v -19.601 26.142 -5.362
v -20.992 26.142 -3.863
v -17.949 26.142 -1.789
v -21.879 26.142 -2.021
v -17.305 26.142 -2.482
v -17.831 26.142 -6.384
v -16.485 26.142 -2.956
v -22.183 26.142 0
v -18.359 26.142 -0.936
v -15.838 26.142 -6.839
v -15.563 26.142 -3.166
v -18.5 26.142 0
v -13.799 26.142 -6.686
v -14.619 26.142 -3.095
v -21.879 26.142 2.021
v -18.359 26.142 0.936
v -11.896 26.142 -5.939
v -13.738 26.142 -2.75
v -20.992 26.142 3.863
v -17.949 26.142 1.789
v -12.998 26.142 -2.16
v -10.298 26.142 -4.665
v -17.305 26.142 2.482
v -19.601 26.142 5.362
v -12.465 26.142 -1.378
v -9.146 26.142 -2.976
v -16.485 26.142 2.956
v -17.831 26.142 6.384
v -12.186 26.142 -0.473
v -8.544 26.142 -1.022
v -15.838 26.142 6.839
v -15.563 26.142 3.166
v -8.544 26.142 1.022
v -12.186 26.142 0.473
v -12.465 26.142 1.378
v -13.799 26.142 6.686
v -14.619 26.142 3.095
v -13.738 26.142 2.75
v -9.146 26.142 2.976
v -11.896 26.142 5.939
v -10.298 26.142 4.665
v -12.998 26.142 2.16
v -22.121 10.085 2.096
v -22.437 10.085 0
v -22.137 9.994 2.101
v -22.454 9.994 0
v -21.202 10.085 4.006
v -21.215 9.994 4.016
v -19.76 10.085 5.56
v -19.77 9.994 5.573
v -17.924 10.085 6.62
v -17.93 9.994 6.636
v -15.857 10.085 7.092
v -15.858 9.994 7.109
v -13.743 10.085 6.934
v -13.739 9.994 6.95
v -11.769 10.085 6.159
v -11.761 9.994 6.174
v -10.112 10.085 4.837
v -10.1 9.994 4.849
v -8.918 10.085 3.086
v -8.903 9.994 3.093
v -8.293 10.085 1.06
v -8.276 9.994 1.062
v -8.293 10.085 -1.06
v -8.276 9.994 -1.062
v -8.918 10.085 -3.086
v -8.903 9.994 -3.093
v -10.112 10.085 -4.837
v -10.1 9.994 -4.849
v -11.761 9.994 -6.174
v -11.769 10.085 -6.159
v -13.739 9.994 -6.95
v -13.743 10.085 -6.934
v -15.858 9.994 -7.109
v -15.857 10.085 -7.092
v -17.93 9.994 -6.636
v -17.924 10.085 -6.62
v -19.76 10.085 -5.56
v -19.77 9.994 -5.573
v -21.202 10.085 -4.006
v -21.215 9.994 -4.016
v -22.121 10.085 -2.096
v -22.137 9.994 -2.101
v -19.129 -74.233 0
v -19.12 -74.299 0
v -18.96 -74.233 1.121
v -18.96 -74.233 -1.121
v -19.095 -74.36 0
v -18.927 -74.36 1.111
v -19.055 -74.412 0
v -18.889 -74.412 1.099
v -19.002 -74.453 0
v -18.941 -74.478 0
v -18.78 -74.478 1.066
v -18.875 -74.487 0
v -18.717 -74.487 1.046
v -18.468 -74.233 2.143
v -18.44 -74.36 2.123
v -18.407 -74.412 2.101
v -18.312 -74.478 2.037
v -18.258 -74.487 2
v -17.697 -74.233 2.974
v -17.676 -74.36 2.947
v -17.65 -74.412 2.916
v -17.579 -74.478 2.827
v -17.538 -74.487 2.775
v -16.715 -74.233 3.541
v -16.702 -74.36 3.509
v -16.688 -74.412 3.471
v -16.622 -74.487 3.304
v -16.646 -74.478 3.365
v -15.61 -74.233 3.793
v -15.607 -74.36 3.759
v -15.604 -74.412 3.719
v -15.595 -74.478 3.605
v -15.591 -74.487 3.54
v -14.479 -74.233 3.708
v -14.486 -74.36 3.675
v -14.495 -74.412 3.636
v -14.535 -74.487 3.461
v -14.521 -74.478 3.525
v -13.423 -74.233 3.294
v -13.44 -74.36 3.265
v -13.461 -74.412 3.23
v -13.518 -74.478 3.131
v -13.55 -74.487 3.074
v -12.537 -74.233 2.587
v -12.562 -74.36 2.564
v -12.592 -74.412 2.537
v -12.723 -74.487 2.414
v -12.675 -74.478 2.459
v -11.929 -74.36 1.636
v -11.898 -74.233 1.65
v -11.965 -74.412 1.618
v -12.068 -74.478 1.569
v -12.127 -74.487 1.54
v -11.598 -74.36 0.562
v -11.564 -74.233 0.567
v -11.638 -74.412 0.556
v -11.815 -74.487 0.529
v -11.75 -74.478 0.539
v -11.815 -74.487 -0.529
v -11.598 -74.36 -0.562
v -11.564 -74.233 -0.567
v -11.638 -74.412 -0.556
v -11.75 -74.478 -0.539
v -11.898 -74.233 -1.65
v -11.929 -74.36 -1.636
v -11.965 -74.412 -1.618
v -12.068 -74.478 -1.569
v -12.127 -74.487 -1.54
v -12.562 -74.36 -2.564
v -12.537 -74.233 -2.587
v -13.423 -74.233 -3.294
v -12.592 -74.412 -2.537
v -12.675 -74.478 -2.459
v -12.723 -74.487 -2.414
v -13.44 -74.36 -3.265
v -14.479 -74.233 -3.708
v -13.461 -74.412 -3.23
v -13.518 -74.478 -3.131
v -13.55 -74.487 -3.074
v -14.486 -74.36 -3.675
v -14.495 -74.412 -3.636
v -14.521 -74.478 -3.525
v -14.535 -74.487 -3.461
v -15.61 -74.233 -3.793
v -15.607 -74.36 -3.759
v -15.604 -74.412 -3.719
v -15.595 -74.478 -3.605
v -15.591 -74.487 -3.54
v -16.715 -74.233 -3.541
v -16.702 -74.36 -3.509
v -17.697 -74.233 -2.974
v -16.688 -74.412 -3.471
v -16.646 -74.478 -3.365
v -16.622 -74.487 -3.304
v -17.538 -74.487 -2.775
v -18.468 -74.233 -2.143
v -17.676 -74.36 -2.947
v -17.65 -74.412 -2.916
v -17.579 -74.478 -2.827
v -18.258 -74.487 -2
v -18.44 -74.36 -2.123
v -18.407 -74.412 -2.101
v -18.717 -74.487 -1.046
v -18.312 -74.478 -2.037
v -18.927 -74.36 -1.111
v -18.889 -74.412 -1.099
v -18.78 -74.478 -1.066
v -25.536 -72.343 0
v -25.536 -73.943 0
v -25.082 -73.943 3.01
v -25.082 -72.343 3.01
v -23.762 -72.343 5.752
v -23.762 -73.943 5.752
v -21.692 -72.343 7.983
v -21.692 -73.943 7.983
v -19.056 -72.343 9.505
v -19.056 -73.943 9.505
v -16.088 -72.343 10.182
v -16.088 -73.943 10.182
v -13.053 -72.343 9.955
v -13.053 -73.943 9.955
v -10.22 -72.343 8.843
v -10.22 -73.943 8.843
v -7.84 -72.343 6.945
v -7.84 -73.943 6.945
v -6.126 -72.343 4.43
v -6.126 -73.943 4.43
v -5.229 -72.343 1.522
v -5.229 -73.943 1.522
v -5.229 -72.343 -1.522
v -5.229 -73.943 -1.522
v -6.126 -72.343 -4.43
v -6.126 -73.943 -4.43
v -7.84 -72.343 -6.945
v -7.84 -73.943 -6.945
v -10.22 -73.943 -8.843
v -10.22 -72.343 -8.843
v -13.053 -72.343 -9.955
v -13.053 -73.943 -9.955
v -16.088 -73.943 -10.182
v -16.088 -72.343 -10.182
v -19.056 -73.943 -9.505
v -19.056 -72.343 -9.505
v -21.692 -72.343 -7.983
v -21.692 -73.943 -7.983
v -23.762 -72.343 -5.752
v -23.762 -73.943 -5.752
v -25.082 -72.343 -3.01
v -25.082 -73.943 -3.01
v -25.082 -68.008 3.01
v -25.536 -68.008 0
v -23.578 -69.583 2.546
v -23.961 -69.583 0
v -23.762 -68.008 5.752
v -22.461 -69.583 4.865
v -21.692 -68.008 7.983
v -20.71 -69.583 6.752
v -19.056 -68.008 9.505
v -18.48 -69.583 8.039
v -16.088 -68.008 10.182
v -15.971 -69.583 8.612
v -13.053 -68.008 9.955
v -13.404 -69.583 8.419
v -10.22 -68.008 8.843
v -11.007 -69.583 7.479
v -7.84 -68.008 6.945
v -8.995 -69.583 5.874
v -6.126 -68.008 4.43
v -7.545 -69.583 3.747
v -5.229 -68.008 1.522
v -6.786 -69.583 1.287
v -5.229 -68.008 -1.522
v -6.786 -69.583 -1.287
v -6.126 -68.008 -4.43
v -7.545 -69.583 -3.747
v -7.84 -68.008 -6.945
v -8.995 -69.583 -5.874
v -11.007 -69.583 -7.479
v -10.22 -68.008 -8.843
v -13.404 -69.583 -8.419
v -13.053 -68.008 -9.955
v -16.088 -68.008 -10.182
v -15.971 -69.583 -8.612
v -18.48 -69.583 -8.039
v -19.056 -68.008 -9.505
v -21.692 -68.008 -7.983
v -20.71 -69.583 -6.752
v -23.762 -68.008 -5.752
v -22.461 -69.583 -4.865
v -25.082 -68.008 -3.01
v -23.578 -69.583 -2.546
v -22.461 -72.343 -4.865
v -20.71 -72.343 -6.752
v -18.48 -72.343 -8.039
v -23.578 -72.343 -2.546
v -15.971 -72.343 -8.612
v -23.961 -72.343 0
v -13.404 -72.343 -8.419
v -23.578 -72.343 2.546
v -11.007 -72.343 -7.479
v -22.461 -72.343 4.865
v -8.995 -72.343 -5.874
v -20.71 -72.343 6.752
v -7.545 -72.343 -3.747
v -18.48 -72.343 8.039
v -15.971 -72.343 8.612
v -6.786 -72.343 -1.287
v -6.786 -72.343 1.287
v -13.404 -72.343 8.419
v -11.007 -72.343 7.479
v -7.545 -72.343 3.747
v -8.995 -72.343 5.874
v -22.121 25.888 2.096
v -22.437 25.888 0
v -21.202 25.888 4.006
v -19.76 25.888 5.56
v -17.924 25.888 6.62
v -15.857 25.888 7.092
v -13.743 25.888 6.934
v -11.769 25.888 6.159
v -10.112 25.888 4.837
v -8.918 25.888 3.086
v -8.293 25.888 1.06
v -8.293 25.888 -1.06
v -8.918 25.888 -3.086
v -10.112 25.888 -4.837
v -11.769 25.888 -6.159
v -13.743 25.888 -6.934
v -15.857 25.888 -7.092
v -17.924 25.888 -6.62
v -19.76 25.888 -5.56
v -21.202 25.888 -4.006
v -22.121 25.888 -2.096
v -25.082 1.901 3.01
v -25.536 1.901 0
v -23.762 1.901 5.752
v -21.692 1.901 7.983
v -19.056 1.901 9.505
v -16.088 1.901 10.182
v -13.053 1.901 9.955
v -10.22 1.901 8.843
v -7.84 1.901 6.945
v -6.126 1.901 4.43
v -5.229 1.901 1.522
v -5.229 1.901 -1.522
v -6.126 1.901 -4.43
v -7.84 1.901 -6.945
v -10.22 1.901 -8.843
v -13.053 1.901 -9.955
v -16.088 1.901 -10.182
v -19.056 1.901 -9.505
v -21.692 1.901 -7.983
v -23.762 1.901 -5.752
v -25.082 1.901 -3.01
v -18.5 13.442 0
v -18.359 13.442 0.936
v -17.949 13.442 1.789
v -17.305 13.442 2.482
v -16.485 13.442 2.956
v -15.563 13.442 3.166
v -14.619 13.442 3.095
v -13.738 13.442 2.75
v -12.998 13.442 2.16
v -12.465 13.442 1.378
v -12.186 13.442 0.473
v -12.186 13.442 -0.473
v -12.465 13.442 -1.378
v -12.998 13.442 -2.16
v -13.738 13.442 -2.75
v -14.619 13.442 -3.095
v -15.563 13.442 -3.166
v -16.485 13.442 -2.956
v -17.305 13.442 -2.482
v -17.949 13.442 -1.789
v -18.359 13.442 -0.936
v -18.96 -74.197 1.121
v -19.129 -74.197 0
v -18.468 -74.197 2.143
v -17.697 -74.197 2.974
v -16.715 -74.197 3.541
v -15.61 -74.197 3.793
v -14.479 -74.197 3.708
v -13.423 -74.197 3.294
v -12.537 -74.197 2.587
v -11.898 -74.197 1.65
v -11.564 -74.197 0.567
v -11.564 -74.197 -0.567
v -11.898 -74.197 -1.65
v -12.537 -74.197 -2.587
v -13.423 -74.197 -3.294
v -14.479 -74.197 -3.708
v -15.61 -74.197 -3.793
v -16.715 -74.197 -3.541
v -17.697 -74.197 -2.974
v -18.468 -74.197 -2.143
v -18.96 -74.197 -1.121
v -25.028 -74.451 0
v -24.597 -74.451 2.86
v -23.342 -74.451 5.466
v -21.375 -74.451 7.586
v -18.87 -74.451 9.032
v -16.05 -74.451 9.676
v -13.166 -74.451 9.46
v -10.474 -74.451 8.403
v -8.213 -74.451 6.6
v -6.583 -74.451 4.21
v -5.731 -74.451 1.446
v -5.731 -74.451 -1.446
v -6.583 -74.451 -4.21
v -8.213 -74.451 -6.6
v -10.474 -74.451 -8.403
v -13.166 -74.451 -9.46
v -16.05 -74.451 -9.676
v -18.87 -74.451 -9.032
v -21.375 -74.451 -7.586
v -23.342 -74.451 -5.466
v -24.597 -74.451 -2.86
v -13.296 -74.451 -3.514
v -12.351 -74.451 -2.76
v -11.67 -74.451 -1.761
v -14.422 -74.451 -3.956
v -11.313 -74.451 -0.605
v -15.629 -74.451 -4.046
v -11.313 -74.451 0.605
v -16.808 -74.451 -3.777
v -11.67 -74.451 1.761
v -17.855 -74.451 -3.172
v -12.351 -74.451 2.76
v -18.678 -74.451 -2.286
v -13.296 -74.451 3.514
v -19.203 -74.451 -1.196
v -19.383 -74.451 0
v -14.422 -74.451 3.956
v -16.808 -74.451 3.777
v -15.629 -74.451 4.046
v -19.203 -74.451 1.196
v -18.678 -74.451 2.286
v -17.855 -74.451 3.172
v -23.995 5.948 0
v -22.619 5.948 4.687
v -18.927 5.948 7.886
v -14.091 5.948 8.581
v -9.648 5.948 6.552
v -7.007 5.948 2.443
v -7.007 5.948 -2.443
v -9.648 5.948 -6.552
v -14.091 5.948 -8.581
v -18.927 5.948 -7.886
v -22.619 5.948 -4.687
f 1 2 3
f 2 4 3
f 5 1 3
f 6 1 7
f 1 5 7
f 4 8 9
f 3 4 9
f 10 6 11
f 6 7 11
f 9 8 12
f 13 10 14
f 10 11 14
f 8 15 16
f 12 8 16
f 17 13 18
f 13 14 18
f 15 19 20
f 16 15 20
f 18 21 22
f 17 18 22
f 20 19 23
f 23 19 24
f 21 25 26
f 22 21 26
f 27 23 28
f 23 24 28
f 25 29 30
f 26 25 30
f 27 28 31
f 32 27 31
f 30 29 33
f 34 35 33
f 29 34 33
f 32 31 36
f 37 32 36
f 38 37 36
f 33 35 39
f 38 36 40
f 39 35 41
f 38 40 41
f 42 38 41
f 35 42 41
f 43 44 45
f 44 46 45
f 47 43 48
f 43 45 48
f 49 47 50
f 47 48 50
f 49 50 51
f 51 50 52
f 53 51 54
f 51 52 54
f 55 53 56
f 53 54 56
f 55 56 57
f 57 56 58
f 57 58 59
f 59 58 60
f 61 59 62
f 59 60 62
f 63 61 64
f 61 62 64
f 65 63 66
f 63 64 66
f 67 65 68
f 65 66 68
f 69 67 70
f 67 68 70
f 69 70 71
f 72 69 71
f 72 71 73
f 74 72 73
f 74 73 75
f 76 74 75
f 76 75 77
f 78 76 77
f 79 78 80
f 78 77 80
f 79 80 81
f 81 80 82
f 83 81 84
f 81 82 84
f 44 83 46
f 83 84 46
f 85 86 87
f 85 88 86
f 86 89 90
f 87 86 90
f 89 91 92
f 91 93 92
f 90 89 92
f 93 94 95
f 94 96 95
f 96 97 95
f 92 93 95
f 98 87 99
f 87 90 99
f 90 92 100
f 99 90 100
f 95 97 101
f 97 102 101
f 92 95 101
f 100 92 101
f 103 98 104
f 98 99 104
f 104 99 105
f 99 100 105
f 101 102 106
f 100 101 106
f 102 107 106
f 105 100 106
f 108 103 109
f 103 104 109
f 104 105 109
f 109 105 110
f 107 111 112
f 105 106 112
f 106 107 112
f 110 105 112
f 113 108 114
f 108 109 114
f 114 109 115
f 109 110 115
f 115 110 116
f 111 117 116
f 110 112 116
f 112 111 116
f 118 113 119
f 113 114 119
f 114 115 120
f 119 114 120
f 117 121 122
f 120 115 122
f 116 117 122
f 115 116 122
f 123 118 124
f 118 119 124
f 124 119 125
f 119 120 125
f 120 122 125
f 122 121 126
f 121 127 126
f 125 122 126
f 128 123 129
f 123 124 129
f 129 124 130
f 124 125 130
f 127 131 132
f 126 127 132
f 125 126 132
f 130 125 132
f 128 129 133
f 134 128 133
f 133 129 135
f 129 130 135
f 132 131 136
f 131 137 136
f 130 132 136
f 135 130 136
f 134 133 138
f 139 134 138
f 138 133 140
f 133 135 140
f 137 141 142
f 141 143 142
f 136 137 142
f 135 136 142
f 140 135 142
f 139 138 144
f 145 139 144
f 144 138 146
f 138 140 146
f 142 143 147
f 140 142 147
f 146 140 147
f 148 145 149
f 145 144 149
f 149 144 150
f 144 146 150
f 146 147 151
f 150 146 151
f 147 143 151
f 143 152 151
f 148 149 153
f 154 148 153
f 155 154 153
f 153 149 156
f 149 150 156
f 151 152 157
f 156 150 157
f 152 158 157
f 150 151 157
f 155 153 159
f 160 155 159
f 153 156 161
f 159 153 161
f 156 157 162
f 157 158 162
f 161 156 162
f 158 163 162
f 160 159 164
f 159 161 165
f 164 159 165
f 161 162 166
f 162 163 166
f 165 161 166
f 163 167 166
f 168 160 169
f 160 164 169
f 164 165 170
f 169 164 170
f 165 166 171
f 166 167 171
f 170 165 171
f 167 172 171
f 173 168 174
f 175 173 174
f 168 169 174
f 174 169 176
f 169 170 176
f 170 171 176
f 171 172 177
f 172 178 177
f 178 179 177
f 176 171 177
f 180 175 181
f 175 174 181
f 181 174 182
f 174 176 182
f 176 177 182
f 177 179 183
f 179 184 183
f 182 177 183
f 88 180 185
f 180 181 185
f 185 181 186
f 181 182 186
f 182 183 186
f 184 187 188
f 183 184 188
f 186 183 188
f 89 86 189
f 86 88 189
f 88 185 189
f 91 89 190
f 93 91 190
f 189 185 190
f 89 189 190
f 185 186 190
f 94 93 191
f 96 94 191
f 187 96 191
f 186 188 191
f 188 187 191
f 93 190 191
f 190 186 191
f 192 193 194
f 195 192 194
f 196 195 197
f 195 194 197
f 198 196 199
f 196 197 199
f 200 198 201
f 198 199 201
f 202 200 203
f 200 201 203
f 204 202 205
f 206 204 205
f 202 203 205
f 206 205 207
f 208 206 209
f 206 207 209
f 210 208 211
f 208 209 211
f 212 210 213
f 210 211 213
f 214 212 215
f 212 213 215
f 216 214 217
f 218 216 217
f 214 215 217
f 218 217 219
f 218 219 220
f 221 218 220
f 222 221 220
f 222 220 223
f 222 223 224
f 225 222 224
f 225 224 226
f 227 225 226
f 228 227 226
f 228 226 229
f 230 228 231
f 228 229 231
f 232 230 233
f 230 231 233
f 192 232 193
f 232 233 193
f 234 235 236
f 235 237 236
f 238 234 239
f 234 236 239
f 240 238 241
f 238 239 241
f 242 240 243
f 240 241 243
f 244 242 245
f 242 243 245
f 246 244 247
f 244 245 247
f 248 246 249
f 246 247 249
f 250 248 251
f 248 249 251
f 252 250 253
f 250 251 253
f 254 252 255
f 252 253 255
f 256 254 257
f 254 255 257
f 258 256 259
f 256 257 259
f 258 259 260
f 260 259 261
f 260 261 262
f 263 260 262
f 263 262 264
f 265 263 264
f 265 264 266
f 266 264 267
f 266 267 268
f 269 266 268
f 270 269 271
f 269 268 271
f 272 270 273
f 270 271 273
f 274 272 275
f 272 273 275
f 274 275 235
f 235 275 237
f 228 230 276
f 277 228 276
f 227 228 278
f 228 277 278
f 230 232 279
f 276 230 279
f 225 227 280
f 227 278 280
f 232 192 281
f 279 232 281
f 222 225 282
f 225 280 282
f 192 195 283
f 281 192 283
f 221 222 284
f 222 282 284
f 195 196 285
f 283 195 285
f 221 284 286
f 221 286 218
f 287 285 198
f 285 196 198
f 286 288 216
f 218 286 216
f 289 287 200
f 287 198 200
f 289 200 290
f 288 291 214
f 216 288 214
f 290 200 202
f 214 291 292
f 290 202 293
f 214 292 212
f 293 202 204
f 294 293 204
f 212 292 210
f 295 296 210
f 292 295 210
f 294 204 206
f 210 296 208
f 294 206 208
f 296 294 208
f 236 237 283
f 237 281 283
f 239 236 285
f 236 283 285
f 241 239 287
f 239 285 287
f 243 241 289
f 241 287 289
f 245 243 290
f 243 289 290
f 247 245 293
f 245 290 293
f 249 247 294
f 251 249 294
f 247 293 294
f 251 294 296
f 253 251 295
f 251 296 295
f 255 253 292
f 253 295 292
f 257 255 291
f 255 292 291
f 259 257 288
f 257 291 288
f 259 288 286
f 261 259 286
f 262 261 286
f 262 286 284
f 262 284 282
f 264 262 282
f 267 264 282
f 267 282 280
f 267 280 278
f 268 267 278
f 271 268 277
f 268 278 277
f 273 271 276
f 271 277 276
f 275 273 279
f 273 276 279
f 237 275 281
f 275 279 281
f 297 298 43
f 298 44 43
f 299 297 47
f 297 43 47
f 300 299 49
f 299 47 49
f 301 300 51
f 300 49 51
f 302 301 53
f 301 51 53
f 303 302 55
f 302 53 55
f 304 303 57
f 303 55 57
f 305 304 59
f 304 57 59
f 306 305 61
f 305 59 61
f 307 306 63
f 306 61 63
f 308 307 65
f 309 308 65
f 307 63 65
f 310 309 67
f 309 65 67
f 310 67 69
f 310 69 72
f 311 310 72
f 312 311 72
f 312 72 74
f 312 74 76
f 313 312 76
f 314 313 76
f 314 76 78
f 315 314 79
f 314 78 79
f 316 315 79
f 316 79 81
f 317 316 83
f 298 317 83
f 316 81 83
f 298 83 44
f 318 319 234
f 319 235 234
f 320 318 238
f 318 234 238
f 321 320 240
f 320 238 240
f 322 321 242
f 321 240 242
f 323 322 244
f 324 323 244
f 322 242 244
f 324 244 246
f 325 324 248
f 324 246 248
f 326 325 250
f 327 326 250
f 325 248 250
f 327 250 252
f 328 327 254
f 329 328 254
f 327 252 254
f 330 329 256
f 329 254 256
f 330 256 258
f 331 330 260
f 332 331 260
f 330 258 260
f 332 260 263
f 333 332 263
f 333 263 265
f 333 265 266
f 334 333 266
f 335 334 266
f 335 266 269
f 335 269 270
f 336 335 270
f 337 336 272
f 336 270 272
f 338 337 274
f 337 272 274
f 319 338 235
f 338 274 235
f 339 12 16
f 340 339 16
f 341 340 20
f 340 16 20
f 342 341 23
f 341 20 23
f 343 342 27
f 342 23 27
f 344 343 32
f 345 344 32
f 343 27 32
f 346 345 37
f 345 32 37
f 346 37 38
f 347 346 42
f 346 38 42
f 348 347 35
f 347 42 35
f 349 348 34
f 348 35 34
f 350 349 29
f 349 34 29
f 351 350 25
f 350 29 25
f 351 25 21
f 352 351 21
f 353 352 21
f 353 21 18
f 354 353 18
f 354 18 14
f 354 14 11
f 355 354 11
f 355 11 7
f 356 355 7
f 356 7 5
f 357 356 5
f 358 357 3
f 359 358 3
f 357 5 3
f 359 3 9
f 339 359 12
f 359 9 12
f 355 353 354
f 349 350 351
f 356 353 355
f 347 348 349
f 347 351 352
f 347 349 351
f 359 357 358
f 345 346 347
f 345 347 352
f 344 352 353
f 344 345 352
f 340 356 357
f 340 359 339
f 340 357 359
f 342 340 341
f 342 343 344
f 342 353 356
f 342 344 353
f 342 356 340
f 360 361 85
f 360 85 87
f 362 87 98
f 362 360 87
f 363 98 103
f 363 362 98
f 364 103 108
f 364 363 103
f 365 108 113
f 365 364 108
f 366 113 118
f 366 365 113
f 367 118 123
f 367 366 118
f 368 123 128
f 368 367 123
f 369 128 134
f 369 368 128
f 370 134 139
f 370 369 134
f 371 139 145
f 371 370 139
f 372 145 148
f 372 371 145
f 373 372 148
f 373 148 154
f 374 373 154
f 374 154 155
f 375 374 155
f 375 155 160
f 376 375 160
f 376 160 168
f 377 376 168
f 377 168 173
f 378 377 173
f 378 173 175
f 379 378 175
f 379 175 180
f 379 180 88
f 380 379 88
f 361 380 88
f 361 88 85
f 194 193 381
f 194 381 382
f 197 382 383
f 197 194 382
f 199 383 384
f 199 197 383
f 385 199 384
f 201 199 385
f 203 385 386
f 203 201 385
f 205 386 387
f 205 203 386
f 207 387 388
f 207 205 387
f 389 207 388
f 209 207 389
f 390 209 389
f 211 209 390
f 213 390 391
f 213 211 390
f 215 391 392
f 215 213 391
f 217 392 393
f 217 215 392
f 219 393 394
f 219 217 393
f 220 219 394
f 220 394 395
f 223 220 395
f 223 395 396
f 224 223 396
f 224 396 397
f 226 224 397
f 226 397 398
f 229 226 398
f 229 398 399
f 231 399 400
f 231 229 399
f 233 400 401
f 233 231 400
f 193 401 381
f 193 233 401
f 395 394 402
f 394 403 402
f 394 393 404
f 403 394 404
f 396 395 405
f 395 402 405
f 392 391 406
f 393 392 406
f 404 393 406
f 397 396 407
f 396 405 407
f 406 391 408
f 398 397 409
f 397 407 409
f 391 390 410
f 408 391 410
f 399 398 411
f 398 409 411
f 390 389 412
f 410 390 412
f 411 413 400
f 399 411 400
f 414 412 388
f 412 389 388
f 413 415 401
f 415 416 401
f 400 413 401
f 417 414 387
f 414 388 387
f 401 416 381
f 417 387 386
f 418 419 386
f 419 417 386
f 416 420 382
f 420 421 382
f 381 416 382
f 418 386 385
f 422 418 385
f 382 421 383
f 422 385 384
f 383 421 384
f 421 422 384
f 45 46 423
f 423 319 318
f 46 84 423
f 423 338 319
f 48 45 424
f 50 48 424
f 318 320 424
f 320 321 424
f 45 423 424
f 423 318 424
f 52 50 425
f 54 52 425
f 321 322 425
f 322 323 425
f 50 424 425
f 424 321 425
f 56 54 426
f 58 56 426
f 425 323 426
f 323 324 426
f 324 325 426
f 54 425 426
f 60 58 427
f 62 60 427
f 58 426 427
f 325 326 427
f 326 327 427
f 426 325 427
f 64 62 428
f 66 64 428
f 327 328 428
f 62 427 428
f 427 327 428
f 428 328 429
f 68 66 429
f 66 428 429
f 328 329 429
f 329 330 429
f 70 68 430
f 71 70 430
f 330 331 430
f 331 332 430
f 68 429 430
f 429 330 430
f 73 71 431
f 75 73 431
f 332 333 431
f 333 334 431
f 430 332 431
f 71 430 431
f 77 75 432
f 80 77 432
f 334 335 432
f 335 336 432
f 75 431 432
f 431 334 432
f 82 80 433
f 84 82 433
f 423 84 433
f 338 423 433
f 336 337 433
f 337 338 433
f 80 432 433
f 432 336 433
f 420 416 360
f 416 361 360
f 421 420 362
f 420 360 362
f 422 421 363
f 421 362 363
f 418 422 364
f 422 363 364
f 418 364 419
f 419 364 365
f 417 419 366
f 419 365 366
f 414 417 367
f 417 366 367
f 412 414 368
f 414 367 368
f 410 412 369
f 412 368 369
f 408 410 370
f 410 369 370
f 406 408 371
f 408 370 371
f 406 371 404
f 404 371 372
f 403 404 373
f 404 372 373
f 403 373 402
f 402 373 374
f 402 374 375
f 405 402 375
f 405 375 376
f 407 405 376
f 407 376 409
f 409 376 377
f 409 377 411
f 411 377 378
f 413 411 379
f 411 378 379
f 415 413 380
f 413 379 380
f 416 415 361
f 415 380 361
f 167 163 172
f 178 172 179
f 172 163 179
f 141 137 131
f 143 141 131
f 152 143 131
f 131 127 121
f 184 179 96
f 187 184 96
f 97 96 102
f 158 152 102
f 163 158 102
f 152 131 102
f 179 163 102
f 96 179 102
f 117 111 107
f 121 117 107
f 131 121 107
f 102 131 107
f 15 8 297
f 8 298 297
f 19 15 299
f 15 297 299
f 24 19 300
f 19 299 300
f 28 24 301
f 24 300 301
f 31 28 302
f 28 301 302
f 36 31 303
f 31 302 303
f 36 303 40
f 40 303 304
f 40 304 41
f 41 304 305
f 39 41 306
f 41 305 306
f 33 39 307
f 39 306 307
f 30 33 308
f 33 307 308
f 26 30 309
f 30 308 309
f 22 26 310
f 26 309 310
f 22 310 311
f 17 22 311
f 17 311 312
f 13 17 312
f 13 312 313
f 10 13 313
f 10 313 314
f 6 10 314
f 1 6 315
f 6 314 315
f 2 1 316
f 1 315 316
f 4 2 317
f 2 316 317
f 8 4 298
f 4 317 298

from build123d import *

# Parameters (mm, degrees)
F3_DEPTH = 5.3848
F4_R     = 0.254
F5_SIZE  = 0.508
F6_R     = 3.175
F7_DEPTH = 12.7


# Not quite as in the source:
# - a fillet or chamfer that OpenCascade refuses, or shapes differently, is made with other operations: its cross-section is extruded or revolved along the edge and cut away or added


with BuildPart() as f1:
    # F0 (on Top) → F1 (revolve)
    with BuildSketch(Plane.XY):
        Polygon((-19.1289222062, -69.1020740439), (-15.3252963252, -69.1020740439), (-15.3252963252, 26.1417003232), (-21.4466963252, 26.1417003232), (-22.4372963252, 26.1417003232), (-22.4372963252, 10.0381003232), (-25.5360963252, 1.9012442353), (-25.5360963252, -68.0084118526), (-23.9612963252, -69.5832118526), (-23.9612963252, -72.3429557647), (-25.5360963252, -72.3429557647), (-25.5360963252, -74.4511557647), (-19.1289222062, -74.4511557647), align=None)
    revolve(axis=Axis((-15.3252963252, -24.1547277207, 0), (0, 1, 0)))

    # F2: chamfer of 0.254 on 3 edges, made by hand

    # F2_s1 → F2_t2 (revolve)
    with BuildSketch(Plane.XY):
        Polygon((-22.4372963252, 10.0848293801), (-22.4539271766, 9.9944308884), (-22.4372963252, 10.0381003232), align=None)
    revolve(axis=Axis((-15.3252963252, 10.0381003232, 0), (0, 1, 0)))

    # F2_s3 → F2_t4 (revolve, cut)
    with BuildSketch(Plane.XY):
        Polygon((-19.3829222062, -74.4511557647), (-19.1289222062, -74.1971557647), (-19.1289222062, -74.4511557647), align=None)
    revolve(axis=Axis((-15.3252963252, -74.4511557647, 0), (0, 1, 0)), mode=Mode.SUBTRACT)

    # F2_s5 → F2_t6 (revolve, cut)
    with BuildSketch(Plane.XY):
        Polygon((-22.1832963252, 26.1417003232), (-22.4372963252, 25.8877003232), (-22.4372963252, 26.1417003232), align=None)
    revolve(axis=Axis((-15.3252963252, 26.1417003232, 0), (0, 1, 0)), mode=Mode.SUBTRACT)

    # F3 (add): a face of the model
    f3_faces = [f1.faces().sort_by_distance(p)[0] for p in [
        (-15.3252963252, -69.1020740439, 0),
    ]]
    extrude(f3_faces, amount=F3_DEPTH)

    # F4
    f4_edges = [f1.edges().sort_by_distance(p)[0] for p in [
        (-11.52167, -74.486874, 0),
    ]]
    fillet(f4_edges, radius=F4_R)

    # F5
    f5_edges = [f1.edges().sort_by_distance(p)[0] for p in [
        (-5.114496, -74.451156, 0),
    ]]
    chamfer(f5_edges, length=F5_SIZE)

    # F6 (on face) → F7 (cut)
    with BuildSketch(Plane(origin=(0, 26.1417003232, 0), x_dir=(-1, 0, 0), z_dir=(0, 1, 0))):
        with Locations((15.3252963252, 0)):
            Circle(F6_R)
    extrude(amount=-F7_DEPTH, mode=Mode.SUBTRACT)


solid = f1.part
